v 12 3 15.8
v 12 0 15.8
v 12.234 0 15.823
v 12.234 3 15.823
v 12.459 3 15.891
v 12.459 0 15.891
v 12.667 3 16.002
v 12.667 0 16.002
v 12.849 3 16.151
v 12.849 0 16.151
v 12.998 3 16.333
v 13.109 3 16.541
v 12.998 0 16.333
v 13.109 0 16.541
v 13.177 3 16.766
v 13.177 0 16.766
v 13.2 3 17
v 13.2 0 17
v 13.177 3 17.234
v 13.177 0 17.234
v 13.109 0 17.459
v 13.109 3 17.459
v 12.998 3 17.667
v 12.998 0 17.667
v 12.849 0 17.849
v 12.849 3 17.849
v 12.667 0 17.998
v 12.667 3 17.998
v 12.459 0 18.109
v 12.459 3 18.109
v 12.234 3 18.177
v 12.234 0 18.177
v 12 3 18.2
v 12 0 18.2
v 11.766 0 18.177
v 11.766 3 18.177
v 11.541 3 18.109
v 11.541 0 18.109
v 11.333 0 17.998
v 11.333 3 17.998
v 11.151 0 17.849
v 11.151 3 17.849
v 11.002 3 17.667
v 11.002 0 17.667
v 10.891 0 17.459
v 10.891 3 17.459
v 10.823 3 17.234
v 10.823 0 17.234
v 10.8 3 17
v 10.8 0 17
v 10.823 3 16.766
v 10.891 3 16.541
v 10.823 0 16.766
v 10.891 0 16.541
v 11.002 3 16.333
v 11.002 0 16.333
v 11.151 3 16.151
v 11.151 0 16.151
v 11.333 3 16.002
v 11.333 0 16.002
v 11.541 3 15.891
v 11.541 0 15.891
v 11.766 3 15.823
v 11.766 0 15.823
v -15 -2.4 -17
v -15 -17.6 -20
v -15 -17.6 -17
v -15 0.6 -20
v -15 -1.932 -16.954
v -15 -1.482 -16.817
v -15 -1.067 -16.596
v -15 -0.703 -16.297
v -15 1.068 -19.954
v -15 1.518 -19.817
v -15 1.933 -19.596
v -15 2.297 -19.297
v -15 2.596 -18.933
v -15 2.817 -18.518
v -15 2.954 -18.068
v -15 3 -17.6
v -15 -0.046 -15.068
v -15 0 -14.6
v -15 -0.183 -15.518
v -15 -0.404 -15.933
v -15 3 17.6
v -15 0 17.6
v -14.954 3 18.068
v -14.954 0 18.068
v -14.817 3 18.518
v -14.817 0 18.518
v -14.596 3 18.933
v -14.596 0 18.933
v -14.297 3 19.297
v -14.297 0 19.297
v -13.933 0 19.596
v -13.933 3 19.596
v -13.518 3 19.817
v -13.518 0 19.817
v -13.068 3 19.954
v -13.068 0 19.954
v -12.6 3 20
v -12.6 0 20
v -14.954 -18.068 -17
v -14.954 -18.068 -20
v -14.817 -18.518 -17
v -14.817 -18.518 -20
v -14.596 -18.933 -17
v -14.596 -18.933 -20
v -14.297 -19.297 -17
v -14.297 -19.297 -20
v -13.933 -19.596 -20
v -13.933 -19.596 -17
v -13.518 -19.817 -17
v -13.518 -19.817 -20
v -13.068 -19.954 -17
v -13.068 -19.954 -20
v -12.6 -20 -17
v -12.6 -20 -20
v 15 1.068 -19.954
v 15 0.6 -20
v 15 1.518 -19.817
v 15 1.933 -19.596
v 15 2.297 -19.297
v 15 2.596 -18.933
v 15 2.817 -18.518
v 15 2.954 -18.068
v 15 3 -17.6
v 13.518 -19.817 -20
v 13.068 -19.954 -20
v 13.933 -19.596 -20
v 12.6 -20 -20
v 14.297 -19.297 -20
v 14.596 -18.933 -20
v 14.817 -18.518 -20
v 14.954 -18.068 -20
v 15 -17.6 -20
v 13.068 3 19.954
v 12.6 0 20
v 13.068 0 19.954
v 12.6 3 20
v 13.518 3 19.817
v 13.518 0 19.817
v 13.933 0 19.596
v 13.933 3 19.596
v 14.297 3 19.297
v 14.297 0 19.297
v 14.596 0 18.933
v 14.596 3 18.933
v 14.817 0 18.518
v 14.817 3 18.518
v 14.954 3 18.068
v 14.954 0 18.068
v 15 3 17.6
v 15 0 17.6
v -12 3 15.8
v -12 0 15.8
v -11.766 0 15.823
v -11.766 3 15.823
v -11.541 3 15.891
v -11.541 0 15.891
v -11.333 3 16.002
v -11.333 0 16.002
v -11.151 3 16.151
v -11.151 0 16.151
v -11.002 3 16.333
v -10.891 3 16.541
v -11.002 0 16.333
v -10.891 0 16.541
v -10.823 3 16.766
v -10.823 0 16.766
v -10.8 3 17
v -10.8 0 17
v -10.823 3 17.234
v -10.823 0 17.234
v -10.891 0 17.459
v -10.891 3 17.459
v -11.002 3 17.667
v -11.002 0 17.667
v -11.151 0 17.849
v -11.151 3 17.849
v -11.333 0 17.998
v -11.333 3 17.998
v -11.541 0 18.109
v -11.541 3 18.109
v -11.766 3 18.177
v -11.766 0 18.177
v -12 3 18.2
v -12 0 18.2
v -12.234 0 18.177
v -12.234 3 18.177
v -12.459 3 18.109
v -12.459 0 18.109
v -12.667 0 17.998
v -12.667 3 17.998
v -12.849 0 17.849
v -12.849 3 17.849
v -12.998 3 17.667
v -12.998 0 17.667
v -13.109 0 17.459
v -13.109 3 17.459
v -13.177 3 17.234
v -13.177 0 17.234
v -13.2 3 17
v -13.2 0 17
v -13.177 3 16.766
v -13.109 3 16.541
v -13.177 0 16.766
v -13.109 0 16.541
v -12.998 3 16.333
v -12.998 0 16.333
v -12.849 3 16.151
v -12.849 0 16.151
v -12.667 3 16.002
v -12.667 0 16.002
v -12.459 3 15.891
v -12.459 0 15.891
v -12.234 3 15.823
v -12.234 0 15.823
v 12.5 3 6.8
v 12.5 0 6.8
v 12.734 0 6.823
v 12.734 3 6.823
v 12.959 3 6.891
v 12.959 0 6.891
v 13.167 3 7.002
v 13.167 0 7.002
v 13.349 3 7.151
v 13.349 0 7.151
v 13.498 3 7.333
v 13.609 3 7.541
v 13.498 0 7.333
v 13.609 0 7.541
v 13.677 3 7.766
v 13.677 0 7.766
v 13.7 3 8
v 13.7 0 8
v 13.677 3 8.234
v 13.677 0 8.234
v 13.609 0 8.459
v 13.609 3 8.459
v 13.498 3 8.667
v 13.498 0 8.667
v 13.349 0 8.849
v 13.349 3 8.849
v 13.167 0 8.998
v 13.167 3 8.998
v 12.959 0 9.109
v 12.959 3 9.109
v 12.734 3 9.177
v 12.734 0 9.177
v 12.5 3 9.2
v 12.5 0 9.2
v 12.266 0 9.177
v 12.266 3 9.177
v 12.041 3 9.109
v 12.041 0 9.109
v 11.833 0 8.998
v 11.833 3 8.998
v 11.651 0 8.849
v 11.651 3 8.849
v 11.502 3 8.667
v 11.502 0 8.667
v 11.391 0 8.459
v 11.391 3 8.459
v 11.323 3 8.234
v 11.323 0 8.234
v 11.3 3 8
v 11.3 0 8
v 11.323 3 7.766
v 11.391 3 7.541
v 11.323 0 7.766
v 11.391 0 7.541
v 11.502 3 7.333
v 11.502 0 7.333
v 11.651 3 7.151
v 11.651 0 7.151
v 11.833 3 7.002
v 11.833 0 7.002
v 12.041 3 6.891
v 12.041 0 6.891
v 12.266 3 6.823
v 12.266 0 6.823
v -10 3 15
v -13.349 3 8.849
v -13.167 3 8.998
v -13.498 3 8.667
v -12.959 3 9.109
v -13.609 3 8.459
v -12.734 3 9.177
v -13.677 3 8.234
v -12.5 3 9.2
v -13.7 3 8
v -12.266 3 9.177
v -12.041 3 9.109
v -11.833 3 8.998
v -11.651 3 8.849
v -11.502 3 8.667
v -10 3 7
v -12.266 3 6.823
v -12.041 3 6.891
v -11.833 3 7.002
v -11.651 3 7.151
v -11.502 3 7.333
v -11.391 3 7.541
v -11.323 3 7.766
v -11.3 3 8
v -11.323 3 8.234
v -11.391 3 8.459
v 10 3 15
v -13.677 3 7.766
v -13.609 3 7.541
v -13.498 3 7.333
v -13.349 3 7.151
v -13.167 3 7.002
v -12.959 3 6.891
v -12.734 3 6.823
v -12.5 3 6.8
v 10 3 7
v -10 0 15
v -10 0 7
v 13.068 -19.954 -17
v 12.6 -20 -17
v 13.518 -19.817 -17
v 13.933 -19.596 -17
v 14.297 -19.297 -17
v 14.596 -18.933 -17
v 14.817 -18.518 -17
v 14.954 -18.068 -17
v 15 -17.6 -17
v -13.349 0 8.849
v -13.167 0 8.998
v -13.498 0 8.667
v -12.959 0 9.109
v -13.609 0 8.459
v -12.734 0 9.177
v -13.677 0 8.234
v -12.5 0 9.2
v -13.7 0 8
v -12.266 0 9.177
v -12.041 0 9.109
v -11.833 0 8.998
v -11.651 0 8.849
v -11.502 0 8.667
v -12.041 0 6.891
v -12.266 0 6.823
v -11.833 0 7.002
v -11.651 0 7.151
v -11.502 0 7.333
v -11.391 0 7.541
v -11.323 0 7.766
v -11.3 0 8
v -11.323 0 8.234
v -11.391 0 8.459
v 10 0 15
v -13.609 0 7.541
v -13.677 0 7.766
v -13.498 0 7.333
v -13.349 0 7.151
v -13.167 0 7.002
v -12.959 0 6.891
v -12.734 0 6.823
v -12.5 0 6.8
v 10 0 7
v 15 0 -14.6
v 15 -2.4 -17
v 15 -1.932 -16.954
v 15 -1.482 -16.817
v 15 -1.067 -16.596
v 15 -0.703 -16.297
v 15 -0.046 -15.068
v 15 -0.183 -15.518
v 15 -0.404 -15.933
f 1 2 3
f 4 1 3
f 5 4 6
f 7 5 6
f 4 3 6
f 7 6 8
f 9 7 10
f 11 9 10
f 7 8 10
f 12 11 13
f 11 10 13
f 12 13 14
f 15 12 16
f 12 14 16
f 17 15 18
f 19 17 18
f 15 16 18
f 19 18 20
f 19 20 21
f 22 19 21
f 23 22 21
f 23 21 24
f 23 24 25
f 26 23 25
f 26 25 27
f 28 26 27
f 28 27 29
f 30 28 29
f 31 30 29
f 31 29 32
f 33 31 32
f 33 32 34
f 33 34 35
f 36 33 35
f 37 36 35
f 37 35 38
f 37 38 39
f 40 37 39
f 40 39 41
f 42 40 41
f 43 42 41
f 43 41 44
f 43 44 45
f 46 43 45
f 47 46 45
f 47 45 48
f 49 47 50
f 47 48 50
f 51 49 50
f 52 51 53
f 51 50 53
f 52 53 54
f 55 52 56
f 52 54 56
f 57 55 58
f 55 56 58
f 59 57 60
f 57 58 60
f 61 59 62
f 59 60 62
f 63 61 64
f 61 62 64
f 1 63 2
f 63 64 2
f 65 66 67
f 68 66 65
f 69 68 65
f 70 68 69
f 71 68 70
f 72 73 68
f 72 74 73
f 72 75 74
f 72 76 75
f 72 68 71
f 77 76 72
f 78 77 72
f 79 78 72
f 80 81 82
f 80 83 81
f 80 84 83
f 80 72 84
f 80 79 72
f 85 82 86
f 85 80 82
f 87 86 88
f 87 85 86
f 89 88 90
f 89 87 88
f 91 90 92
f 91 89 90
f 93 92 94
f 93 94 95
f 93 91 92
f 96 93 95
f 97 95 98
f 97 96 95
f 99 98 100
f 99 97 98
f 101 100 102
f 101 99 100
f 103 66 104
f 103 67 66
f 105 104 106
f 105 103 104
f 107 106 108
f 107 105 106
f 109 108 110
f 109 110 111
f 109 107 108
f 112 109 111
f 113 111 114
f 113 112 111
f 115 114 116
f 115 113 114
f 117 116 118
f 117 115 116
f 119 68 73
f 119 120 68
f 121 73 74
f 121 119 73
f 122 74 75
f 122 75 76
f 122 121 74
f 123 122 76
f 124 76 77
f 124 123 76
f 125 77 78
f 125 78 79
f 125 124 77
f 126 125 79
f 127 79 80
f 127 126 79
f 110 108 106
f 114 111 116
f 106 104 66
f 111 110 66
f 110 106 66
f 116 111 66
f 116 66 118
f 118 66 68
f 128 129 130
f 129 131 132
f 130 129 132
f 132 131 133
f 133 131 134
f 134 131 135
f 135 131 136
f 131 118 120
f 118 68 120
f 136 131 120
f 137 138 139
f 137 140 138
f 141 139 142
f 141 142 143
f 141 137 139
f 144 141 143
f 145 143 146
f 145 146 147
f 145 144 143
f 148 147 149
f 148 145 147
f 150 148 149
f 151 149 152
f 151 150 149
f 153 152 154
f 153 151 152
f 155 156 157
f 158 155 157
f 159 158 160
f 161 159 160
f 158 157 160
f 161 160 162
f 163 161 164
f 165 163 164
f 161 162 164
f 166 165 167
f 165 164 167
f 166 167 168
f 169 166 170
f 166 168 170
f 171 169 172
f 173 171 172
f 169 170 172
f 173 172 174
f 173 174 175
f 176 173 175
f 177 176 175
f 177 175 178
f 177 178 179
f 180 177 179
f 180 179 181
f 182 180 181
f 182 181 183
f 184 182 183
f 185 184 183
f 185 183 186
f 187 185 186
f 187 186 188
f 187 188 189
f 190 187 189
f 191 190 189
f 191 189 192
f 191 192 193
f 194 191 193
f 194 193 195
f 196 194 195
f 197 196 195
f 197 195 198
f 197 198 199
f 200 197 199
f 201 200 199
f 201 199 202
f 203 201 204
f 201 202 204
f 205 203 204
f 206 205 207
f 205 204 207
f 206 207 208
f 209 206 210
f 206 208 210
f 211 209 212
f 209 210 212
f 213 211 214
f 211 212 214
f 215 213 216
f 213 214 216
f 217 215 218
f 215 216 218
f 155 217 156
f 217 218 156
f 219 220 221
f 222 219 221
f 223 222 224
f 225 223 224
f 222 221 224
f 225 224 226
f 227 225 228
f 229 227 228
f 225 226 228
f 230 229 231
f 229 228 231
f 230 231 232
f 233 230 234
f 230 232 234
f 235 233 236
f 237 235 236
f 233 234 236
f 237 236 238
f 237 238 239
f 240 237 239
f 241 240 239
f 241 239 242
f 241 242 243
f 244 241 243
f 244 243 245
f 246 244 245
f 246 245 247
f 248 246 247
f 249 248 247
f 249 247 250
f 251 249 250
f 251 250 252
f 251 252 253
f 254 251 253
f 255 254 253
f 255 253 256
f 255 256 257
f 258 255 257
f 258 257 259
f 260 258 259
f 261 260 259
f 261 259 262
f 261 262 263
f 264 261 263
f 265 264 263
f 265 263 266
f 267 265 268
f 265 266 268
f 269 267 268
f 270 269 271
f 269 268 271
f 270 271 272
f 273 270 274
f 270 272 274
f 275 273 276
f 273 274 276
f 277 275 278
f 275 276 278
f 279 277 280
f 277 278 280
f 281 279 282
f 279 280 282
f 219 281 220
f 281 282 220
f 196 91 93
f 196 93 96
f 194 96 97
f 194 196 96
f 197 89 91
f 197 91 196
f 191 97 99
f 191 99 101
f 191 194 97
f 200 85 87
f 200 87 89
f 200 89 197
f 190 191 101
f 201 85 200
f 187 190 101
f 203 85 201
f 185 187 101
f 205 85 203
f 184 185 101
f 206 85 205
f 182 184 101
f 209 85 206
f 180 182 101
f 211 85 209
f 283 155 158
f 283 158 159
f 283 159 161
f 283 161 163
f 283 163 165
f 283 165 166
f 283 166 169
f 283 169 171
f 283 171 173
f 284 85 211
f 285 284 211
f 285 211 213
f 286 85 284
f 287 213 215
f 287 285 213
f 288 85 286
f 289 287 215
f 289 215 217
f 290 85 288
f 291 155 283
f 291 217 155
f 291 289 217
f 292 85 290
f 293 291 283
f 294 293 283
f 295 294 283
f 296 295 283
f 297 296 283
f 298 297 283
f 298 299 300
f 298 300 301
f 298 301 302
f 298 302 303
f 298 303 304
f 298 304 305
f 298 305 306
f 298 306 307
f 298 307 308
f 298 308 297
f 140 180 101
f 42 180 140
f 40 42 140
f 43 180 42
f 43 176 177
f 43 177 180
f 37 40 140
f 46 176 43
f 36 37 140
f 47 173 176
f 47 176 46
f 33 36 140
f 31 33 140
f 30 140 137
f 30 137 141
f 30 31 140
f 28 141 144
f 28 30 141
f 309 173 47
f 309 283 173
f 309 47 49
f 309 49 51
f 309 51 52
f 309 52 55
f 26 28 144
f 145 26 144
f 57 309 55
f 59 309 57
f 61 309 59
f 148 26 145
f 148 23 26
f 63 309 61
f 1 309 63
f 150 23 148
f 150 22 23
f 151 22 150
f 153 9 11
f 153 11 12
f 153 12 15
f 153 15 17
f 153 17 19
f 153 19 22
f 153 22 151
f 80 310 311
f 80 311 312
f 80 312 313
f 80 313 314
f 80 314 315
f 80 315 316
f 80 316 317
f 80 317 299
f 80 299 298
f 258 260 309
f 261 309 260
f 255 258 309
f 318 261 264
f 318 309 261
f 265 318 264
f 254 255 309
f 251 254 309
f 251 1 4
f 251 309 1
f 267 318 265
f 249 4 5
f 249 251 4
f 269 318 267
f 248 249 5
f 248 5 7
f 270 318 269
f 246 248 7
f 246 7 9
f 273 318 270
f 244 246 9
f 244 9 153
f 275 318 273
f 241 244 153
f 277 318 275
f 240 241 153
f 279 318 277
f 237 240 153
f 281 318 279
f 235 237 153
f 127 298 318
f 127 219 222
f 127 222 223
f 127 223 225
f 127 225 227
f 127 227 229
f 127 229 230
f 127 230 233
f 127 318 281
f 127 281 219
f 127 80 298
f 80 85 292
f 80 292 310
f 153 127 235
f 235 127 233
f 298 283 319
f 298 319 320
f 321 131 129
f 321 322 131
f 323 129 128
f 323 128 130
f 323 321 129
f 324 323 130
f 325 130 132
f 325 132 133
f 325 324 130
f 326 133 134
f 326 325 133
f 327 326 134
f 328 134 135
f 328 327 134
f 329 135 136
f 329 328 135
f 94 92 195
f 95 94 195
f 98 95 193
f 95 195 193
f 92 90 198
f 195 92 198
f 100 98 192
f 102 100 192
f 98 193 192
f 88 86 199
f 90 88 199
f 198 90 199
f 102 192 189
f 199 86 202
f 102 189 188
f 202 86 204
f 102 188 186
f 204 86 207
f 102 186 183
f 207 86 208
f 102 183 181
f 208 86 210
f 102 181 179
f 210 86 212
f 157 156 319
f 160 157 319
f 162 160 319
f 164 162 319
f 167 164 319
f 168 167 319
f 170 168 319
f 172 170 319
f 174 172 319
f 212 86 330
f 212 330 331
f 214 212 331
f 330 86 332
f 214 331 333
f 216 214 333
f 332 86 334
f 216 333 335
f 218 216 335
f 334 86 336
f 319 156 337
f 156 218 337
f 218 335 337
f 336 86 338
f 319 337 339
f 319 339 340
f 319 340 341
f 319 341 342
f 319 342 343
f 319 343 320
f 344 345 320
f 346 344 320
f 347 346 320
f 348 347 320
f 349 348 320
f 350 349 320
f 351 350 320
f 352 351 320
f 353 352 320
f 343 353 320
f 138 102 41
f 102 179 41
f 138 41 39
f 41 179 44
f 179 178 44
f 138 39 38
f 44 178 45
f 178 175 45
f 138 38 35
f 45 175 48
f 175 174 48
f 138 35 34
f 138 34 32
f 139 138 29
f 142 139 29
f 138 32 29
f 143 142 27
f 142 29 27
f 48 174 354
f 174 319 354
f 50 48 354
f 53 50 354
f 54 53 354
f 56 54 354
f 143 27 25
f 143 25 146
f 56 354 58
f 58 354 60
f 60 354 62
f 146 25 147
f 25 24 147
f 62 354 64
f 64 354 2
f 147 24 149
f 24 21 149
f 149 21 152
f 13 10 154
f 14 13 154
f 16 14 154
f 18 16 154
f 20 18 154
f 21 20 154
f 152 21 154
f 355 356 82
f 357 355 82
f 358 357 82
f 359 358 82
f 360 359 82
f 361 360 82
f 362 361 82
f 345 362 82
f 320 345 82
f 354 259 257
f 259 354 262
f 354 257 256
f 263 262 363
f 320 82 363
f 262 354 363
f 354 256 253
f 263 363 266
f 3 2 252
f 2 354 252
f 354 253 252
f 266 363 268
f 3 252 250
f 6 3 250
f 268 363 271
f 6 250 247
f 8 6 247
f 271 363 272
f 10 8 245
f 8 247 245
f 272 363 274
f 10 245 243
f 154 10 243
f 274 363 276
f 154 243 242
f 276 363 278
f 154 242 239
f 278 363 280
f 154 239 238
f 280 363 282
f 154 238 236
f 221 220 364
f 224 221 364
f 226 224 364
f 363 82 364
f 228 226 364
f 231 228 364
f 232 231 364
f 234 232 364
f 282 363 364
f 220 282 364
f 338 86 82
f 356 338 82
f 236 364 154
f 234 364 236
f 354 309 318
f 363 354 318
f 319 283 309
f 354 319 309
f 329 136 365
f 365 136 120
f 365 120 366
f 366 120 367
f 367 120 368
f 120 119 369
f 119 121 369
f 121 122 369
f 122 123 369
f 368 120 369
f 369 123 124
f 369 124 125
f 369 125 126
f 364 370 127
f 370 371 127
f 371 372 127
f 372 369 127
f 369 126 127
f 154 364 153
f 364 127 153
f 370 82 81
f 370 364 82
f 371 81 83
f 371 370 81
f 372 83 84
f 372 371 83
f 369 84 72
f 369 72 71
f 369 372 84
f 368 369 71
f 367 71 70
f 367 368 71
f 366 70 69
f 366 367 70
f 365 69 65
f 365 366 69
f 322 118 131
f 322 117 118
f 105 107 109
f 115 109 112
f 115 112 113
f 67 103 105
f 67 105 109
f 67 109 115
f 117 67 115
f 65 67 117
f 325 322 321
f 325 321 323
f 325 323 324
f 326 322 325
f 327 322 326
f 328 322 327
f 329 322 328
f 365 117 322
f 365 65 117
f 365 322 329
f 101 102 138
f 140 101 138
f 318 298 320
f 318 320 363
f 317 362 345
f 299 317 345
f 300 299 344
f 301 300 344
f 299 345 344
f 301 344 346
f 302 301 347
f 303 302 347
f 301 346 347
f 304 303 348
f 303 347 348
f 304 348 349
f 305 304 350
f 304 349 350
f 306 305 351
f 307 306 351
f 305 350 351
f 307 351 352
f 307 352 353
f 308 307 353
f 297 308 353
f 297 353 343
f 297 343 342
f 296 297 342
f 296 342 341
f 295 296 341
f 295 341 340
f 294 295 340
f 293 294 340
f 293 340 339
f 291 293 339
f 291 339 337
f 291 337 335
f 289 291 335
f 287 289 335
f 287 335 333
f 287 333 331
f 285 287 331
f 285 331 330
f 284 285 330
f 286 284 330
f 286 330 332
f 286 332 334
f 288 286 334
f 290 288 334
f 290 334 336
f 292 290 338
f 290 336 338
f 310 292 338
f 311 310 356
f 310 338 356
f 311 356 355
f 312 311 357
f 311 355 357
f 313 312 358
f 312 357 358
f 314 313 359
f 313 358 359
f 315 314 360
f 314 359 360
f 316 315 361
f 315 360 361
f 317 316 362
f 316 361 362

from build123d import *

# Parameters (mm, degrees)
ESBO_O1_W                = 30
ESBO_O1_H                = 40
RESSALTO_EXTRUS_O1_DEPTH = 3
ESBO_O2_W                = 20
ESBO_O2_H                = 8
CORTE_EXTRUS_O1_DEPTH    = 26.179356624
ESBO_O3_R                = 1.2
CORTE_EXTRUS_O2_DEPTH    = 26.179356624
ESBO_O4_W                = 30
ESBO_O4_H                = 3
RESSALTO_EXTRUS_O2_DEPTH = 20
FILETE5_R                = 2.4
FILETE6_R                = 2.4
FILETE7_R                = 2.4
FILETE8_R                = 2.4


with BuildPart() as part:
    # Esboço1 → Ressalto-extrusão1 (new body)
    with BuildSketch(Plane(origin=(0, 0, 0), x_dir=(1, 0, 0), z_dir=(0, 1, 0))):
        Rectangle(ESBO_O1_W, ESBO_O1_H)
    extrude(amount=RESSALTO_EXTRUS_O1_DEPTH)

    # Esboço2 → Corte-extrusão1 (cut, through all)
    with BuildSketch(Plane(origin=(0, 3, 0), x_dir=(1, 0, 0), z_dir=(0, 1, 0))):
        with Locations((0, -11)):
            Rectangle(ESBO_O2_W, ESBO_O2_H)
    extrude(amount=-CORTE_EXTRUS_O1_DEPTH, mode=Mode.SUBTRACT)

    # Esboço3 → Corte-extrusão2 (cut, through all)
    with BuildSketch(Plane.XZ):
        with Locations(Location((-12, 17, 0), (0, 0, 270))):
            Circle(ESBO_O3_R)
        with Locations(Location((12, 17, 0), (0, 0, 270))):
            Circle(ESBO_O3_R)
        with Locations(Location((-12.5, 8, 0), (0, 0, 270))):
            Circle(ESBO_O3_R)
        with Locations(Location((12.5, 8, 0), (0, 0, 270))):
            Circle(ESBO_O3_R)
    extrude(amount=-CORTE_EXTRUS_O2_DEPTH, mode=Mode.SUBTRACT)

    # Esboço4 → Ressalto-extrusão2 (add)
    with BuildSketch(Plane.XZ):
        with Locations((0, -18.5)):
            Rectangle(ESBO_O4_W, ESBO_O4_H)
    extrude(amount=RESSALTO_EXTRUS_O2_DEPTH)

    # Filete5
    filete5_edges = [part.edges().sort_by_distance(p)[0] for p in [
        (0, 0, -17),
    ]]
    fillet(filete5_edges, radius=FILETE5_R)

    # Filete6
    filete6_edges = [part.edges().sort_by_distance(p)[0] for p in [
        (0, 3, -20),
    ]]
    fillet(filete6_edges, radius=FILETE6_R)

    # Filete7
    filete7_edges = [part.edges().sort_by_distance(p)[0] for p in [
        (15, 1.5, 20),
        (-15, 1.5, 20),
    ]]
    fillet(filete7_edges, radius=FILETE7_R)

    # Filete8
    filete8_edges = [part.edges().sort_by_distance(p)[0] for p in [
        (-15, -20, -18.5),
        (15, -20, -18.5),
    ]]
    fillet(filete8_edges, radius=FILETE8_R)


solid = part.part
